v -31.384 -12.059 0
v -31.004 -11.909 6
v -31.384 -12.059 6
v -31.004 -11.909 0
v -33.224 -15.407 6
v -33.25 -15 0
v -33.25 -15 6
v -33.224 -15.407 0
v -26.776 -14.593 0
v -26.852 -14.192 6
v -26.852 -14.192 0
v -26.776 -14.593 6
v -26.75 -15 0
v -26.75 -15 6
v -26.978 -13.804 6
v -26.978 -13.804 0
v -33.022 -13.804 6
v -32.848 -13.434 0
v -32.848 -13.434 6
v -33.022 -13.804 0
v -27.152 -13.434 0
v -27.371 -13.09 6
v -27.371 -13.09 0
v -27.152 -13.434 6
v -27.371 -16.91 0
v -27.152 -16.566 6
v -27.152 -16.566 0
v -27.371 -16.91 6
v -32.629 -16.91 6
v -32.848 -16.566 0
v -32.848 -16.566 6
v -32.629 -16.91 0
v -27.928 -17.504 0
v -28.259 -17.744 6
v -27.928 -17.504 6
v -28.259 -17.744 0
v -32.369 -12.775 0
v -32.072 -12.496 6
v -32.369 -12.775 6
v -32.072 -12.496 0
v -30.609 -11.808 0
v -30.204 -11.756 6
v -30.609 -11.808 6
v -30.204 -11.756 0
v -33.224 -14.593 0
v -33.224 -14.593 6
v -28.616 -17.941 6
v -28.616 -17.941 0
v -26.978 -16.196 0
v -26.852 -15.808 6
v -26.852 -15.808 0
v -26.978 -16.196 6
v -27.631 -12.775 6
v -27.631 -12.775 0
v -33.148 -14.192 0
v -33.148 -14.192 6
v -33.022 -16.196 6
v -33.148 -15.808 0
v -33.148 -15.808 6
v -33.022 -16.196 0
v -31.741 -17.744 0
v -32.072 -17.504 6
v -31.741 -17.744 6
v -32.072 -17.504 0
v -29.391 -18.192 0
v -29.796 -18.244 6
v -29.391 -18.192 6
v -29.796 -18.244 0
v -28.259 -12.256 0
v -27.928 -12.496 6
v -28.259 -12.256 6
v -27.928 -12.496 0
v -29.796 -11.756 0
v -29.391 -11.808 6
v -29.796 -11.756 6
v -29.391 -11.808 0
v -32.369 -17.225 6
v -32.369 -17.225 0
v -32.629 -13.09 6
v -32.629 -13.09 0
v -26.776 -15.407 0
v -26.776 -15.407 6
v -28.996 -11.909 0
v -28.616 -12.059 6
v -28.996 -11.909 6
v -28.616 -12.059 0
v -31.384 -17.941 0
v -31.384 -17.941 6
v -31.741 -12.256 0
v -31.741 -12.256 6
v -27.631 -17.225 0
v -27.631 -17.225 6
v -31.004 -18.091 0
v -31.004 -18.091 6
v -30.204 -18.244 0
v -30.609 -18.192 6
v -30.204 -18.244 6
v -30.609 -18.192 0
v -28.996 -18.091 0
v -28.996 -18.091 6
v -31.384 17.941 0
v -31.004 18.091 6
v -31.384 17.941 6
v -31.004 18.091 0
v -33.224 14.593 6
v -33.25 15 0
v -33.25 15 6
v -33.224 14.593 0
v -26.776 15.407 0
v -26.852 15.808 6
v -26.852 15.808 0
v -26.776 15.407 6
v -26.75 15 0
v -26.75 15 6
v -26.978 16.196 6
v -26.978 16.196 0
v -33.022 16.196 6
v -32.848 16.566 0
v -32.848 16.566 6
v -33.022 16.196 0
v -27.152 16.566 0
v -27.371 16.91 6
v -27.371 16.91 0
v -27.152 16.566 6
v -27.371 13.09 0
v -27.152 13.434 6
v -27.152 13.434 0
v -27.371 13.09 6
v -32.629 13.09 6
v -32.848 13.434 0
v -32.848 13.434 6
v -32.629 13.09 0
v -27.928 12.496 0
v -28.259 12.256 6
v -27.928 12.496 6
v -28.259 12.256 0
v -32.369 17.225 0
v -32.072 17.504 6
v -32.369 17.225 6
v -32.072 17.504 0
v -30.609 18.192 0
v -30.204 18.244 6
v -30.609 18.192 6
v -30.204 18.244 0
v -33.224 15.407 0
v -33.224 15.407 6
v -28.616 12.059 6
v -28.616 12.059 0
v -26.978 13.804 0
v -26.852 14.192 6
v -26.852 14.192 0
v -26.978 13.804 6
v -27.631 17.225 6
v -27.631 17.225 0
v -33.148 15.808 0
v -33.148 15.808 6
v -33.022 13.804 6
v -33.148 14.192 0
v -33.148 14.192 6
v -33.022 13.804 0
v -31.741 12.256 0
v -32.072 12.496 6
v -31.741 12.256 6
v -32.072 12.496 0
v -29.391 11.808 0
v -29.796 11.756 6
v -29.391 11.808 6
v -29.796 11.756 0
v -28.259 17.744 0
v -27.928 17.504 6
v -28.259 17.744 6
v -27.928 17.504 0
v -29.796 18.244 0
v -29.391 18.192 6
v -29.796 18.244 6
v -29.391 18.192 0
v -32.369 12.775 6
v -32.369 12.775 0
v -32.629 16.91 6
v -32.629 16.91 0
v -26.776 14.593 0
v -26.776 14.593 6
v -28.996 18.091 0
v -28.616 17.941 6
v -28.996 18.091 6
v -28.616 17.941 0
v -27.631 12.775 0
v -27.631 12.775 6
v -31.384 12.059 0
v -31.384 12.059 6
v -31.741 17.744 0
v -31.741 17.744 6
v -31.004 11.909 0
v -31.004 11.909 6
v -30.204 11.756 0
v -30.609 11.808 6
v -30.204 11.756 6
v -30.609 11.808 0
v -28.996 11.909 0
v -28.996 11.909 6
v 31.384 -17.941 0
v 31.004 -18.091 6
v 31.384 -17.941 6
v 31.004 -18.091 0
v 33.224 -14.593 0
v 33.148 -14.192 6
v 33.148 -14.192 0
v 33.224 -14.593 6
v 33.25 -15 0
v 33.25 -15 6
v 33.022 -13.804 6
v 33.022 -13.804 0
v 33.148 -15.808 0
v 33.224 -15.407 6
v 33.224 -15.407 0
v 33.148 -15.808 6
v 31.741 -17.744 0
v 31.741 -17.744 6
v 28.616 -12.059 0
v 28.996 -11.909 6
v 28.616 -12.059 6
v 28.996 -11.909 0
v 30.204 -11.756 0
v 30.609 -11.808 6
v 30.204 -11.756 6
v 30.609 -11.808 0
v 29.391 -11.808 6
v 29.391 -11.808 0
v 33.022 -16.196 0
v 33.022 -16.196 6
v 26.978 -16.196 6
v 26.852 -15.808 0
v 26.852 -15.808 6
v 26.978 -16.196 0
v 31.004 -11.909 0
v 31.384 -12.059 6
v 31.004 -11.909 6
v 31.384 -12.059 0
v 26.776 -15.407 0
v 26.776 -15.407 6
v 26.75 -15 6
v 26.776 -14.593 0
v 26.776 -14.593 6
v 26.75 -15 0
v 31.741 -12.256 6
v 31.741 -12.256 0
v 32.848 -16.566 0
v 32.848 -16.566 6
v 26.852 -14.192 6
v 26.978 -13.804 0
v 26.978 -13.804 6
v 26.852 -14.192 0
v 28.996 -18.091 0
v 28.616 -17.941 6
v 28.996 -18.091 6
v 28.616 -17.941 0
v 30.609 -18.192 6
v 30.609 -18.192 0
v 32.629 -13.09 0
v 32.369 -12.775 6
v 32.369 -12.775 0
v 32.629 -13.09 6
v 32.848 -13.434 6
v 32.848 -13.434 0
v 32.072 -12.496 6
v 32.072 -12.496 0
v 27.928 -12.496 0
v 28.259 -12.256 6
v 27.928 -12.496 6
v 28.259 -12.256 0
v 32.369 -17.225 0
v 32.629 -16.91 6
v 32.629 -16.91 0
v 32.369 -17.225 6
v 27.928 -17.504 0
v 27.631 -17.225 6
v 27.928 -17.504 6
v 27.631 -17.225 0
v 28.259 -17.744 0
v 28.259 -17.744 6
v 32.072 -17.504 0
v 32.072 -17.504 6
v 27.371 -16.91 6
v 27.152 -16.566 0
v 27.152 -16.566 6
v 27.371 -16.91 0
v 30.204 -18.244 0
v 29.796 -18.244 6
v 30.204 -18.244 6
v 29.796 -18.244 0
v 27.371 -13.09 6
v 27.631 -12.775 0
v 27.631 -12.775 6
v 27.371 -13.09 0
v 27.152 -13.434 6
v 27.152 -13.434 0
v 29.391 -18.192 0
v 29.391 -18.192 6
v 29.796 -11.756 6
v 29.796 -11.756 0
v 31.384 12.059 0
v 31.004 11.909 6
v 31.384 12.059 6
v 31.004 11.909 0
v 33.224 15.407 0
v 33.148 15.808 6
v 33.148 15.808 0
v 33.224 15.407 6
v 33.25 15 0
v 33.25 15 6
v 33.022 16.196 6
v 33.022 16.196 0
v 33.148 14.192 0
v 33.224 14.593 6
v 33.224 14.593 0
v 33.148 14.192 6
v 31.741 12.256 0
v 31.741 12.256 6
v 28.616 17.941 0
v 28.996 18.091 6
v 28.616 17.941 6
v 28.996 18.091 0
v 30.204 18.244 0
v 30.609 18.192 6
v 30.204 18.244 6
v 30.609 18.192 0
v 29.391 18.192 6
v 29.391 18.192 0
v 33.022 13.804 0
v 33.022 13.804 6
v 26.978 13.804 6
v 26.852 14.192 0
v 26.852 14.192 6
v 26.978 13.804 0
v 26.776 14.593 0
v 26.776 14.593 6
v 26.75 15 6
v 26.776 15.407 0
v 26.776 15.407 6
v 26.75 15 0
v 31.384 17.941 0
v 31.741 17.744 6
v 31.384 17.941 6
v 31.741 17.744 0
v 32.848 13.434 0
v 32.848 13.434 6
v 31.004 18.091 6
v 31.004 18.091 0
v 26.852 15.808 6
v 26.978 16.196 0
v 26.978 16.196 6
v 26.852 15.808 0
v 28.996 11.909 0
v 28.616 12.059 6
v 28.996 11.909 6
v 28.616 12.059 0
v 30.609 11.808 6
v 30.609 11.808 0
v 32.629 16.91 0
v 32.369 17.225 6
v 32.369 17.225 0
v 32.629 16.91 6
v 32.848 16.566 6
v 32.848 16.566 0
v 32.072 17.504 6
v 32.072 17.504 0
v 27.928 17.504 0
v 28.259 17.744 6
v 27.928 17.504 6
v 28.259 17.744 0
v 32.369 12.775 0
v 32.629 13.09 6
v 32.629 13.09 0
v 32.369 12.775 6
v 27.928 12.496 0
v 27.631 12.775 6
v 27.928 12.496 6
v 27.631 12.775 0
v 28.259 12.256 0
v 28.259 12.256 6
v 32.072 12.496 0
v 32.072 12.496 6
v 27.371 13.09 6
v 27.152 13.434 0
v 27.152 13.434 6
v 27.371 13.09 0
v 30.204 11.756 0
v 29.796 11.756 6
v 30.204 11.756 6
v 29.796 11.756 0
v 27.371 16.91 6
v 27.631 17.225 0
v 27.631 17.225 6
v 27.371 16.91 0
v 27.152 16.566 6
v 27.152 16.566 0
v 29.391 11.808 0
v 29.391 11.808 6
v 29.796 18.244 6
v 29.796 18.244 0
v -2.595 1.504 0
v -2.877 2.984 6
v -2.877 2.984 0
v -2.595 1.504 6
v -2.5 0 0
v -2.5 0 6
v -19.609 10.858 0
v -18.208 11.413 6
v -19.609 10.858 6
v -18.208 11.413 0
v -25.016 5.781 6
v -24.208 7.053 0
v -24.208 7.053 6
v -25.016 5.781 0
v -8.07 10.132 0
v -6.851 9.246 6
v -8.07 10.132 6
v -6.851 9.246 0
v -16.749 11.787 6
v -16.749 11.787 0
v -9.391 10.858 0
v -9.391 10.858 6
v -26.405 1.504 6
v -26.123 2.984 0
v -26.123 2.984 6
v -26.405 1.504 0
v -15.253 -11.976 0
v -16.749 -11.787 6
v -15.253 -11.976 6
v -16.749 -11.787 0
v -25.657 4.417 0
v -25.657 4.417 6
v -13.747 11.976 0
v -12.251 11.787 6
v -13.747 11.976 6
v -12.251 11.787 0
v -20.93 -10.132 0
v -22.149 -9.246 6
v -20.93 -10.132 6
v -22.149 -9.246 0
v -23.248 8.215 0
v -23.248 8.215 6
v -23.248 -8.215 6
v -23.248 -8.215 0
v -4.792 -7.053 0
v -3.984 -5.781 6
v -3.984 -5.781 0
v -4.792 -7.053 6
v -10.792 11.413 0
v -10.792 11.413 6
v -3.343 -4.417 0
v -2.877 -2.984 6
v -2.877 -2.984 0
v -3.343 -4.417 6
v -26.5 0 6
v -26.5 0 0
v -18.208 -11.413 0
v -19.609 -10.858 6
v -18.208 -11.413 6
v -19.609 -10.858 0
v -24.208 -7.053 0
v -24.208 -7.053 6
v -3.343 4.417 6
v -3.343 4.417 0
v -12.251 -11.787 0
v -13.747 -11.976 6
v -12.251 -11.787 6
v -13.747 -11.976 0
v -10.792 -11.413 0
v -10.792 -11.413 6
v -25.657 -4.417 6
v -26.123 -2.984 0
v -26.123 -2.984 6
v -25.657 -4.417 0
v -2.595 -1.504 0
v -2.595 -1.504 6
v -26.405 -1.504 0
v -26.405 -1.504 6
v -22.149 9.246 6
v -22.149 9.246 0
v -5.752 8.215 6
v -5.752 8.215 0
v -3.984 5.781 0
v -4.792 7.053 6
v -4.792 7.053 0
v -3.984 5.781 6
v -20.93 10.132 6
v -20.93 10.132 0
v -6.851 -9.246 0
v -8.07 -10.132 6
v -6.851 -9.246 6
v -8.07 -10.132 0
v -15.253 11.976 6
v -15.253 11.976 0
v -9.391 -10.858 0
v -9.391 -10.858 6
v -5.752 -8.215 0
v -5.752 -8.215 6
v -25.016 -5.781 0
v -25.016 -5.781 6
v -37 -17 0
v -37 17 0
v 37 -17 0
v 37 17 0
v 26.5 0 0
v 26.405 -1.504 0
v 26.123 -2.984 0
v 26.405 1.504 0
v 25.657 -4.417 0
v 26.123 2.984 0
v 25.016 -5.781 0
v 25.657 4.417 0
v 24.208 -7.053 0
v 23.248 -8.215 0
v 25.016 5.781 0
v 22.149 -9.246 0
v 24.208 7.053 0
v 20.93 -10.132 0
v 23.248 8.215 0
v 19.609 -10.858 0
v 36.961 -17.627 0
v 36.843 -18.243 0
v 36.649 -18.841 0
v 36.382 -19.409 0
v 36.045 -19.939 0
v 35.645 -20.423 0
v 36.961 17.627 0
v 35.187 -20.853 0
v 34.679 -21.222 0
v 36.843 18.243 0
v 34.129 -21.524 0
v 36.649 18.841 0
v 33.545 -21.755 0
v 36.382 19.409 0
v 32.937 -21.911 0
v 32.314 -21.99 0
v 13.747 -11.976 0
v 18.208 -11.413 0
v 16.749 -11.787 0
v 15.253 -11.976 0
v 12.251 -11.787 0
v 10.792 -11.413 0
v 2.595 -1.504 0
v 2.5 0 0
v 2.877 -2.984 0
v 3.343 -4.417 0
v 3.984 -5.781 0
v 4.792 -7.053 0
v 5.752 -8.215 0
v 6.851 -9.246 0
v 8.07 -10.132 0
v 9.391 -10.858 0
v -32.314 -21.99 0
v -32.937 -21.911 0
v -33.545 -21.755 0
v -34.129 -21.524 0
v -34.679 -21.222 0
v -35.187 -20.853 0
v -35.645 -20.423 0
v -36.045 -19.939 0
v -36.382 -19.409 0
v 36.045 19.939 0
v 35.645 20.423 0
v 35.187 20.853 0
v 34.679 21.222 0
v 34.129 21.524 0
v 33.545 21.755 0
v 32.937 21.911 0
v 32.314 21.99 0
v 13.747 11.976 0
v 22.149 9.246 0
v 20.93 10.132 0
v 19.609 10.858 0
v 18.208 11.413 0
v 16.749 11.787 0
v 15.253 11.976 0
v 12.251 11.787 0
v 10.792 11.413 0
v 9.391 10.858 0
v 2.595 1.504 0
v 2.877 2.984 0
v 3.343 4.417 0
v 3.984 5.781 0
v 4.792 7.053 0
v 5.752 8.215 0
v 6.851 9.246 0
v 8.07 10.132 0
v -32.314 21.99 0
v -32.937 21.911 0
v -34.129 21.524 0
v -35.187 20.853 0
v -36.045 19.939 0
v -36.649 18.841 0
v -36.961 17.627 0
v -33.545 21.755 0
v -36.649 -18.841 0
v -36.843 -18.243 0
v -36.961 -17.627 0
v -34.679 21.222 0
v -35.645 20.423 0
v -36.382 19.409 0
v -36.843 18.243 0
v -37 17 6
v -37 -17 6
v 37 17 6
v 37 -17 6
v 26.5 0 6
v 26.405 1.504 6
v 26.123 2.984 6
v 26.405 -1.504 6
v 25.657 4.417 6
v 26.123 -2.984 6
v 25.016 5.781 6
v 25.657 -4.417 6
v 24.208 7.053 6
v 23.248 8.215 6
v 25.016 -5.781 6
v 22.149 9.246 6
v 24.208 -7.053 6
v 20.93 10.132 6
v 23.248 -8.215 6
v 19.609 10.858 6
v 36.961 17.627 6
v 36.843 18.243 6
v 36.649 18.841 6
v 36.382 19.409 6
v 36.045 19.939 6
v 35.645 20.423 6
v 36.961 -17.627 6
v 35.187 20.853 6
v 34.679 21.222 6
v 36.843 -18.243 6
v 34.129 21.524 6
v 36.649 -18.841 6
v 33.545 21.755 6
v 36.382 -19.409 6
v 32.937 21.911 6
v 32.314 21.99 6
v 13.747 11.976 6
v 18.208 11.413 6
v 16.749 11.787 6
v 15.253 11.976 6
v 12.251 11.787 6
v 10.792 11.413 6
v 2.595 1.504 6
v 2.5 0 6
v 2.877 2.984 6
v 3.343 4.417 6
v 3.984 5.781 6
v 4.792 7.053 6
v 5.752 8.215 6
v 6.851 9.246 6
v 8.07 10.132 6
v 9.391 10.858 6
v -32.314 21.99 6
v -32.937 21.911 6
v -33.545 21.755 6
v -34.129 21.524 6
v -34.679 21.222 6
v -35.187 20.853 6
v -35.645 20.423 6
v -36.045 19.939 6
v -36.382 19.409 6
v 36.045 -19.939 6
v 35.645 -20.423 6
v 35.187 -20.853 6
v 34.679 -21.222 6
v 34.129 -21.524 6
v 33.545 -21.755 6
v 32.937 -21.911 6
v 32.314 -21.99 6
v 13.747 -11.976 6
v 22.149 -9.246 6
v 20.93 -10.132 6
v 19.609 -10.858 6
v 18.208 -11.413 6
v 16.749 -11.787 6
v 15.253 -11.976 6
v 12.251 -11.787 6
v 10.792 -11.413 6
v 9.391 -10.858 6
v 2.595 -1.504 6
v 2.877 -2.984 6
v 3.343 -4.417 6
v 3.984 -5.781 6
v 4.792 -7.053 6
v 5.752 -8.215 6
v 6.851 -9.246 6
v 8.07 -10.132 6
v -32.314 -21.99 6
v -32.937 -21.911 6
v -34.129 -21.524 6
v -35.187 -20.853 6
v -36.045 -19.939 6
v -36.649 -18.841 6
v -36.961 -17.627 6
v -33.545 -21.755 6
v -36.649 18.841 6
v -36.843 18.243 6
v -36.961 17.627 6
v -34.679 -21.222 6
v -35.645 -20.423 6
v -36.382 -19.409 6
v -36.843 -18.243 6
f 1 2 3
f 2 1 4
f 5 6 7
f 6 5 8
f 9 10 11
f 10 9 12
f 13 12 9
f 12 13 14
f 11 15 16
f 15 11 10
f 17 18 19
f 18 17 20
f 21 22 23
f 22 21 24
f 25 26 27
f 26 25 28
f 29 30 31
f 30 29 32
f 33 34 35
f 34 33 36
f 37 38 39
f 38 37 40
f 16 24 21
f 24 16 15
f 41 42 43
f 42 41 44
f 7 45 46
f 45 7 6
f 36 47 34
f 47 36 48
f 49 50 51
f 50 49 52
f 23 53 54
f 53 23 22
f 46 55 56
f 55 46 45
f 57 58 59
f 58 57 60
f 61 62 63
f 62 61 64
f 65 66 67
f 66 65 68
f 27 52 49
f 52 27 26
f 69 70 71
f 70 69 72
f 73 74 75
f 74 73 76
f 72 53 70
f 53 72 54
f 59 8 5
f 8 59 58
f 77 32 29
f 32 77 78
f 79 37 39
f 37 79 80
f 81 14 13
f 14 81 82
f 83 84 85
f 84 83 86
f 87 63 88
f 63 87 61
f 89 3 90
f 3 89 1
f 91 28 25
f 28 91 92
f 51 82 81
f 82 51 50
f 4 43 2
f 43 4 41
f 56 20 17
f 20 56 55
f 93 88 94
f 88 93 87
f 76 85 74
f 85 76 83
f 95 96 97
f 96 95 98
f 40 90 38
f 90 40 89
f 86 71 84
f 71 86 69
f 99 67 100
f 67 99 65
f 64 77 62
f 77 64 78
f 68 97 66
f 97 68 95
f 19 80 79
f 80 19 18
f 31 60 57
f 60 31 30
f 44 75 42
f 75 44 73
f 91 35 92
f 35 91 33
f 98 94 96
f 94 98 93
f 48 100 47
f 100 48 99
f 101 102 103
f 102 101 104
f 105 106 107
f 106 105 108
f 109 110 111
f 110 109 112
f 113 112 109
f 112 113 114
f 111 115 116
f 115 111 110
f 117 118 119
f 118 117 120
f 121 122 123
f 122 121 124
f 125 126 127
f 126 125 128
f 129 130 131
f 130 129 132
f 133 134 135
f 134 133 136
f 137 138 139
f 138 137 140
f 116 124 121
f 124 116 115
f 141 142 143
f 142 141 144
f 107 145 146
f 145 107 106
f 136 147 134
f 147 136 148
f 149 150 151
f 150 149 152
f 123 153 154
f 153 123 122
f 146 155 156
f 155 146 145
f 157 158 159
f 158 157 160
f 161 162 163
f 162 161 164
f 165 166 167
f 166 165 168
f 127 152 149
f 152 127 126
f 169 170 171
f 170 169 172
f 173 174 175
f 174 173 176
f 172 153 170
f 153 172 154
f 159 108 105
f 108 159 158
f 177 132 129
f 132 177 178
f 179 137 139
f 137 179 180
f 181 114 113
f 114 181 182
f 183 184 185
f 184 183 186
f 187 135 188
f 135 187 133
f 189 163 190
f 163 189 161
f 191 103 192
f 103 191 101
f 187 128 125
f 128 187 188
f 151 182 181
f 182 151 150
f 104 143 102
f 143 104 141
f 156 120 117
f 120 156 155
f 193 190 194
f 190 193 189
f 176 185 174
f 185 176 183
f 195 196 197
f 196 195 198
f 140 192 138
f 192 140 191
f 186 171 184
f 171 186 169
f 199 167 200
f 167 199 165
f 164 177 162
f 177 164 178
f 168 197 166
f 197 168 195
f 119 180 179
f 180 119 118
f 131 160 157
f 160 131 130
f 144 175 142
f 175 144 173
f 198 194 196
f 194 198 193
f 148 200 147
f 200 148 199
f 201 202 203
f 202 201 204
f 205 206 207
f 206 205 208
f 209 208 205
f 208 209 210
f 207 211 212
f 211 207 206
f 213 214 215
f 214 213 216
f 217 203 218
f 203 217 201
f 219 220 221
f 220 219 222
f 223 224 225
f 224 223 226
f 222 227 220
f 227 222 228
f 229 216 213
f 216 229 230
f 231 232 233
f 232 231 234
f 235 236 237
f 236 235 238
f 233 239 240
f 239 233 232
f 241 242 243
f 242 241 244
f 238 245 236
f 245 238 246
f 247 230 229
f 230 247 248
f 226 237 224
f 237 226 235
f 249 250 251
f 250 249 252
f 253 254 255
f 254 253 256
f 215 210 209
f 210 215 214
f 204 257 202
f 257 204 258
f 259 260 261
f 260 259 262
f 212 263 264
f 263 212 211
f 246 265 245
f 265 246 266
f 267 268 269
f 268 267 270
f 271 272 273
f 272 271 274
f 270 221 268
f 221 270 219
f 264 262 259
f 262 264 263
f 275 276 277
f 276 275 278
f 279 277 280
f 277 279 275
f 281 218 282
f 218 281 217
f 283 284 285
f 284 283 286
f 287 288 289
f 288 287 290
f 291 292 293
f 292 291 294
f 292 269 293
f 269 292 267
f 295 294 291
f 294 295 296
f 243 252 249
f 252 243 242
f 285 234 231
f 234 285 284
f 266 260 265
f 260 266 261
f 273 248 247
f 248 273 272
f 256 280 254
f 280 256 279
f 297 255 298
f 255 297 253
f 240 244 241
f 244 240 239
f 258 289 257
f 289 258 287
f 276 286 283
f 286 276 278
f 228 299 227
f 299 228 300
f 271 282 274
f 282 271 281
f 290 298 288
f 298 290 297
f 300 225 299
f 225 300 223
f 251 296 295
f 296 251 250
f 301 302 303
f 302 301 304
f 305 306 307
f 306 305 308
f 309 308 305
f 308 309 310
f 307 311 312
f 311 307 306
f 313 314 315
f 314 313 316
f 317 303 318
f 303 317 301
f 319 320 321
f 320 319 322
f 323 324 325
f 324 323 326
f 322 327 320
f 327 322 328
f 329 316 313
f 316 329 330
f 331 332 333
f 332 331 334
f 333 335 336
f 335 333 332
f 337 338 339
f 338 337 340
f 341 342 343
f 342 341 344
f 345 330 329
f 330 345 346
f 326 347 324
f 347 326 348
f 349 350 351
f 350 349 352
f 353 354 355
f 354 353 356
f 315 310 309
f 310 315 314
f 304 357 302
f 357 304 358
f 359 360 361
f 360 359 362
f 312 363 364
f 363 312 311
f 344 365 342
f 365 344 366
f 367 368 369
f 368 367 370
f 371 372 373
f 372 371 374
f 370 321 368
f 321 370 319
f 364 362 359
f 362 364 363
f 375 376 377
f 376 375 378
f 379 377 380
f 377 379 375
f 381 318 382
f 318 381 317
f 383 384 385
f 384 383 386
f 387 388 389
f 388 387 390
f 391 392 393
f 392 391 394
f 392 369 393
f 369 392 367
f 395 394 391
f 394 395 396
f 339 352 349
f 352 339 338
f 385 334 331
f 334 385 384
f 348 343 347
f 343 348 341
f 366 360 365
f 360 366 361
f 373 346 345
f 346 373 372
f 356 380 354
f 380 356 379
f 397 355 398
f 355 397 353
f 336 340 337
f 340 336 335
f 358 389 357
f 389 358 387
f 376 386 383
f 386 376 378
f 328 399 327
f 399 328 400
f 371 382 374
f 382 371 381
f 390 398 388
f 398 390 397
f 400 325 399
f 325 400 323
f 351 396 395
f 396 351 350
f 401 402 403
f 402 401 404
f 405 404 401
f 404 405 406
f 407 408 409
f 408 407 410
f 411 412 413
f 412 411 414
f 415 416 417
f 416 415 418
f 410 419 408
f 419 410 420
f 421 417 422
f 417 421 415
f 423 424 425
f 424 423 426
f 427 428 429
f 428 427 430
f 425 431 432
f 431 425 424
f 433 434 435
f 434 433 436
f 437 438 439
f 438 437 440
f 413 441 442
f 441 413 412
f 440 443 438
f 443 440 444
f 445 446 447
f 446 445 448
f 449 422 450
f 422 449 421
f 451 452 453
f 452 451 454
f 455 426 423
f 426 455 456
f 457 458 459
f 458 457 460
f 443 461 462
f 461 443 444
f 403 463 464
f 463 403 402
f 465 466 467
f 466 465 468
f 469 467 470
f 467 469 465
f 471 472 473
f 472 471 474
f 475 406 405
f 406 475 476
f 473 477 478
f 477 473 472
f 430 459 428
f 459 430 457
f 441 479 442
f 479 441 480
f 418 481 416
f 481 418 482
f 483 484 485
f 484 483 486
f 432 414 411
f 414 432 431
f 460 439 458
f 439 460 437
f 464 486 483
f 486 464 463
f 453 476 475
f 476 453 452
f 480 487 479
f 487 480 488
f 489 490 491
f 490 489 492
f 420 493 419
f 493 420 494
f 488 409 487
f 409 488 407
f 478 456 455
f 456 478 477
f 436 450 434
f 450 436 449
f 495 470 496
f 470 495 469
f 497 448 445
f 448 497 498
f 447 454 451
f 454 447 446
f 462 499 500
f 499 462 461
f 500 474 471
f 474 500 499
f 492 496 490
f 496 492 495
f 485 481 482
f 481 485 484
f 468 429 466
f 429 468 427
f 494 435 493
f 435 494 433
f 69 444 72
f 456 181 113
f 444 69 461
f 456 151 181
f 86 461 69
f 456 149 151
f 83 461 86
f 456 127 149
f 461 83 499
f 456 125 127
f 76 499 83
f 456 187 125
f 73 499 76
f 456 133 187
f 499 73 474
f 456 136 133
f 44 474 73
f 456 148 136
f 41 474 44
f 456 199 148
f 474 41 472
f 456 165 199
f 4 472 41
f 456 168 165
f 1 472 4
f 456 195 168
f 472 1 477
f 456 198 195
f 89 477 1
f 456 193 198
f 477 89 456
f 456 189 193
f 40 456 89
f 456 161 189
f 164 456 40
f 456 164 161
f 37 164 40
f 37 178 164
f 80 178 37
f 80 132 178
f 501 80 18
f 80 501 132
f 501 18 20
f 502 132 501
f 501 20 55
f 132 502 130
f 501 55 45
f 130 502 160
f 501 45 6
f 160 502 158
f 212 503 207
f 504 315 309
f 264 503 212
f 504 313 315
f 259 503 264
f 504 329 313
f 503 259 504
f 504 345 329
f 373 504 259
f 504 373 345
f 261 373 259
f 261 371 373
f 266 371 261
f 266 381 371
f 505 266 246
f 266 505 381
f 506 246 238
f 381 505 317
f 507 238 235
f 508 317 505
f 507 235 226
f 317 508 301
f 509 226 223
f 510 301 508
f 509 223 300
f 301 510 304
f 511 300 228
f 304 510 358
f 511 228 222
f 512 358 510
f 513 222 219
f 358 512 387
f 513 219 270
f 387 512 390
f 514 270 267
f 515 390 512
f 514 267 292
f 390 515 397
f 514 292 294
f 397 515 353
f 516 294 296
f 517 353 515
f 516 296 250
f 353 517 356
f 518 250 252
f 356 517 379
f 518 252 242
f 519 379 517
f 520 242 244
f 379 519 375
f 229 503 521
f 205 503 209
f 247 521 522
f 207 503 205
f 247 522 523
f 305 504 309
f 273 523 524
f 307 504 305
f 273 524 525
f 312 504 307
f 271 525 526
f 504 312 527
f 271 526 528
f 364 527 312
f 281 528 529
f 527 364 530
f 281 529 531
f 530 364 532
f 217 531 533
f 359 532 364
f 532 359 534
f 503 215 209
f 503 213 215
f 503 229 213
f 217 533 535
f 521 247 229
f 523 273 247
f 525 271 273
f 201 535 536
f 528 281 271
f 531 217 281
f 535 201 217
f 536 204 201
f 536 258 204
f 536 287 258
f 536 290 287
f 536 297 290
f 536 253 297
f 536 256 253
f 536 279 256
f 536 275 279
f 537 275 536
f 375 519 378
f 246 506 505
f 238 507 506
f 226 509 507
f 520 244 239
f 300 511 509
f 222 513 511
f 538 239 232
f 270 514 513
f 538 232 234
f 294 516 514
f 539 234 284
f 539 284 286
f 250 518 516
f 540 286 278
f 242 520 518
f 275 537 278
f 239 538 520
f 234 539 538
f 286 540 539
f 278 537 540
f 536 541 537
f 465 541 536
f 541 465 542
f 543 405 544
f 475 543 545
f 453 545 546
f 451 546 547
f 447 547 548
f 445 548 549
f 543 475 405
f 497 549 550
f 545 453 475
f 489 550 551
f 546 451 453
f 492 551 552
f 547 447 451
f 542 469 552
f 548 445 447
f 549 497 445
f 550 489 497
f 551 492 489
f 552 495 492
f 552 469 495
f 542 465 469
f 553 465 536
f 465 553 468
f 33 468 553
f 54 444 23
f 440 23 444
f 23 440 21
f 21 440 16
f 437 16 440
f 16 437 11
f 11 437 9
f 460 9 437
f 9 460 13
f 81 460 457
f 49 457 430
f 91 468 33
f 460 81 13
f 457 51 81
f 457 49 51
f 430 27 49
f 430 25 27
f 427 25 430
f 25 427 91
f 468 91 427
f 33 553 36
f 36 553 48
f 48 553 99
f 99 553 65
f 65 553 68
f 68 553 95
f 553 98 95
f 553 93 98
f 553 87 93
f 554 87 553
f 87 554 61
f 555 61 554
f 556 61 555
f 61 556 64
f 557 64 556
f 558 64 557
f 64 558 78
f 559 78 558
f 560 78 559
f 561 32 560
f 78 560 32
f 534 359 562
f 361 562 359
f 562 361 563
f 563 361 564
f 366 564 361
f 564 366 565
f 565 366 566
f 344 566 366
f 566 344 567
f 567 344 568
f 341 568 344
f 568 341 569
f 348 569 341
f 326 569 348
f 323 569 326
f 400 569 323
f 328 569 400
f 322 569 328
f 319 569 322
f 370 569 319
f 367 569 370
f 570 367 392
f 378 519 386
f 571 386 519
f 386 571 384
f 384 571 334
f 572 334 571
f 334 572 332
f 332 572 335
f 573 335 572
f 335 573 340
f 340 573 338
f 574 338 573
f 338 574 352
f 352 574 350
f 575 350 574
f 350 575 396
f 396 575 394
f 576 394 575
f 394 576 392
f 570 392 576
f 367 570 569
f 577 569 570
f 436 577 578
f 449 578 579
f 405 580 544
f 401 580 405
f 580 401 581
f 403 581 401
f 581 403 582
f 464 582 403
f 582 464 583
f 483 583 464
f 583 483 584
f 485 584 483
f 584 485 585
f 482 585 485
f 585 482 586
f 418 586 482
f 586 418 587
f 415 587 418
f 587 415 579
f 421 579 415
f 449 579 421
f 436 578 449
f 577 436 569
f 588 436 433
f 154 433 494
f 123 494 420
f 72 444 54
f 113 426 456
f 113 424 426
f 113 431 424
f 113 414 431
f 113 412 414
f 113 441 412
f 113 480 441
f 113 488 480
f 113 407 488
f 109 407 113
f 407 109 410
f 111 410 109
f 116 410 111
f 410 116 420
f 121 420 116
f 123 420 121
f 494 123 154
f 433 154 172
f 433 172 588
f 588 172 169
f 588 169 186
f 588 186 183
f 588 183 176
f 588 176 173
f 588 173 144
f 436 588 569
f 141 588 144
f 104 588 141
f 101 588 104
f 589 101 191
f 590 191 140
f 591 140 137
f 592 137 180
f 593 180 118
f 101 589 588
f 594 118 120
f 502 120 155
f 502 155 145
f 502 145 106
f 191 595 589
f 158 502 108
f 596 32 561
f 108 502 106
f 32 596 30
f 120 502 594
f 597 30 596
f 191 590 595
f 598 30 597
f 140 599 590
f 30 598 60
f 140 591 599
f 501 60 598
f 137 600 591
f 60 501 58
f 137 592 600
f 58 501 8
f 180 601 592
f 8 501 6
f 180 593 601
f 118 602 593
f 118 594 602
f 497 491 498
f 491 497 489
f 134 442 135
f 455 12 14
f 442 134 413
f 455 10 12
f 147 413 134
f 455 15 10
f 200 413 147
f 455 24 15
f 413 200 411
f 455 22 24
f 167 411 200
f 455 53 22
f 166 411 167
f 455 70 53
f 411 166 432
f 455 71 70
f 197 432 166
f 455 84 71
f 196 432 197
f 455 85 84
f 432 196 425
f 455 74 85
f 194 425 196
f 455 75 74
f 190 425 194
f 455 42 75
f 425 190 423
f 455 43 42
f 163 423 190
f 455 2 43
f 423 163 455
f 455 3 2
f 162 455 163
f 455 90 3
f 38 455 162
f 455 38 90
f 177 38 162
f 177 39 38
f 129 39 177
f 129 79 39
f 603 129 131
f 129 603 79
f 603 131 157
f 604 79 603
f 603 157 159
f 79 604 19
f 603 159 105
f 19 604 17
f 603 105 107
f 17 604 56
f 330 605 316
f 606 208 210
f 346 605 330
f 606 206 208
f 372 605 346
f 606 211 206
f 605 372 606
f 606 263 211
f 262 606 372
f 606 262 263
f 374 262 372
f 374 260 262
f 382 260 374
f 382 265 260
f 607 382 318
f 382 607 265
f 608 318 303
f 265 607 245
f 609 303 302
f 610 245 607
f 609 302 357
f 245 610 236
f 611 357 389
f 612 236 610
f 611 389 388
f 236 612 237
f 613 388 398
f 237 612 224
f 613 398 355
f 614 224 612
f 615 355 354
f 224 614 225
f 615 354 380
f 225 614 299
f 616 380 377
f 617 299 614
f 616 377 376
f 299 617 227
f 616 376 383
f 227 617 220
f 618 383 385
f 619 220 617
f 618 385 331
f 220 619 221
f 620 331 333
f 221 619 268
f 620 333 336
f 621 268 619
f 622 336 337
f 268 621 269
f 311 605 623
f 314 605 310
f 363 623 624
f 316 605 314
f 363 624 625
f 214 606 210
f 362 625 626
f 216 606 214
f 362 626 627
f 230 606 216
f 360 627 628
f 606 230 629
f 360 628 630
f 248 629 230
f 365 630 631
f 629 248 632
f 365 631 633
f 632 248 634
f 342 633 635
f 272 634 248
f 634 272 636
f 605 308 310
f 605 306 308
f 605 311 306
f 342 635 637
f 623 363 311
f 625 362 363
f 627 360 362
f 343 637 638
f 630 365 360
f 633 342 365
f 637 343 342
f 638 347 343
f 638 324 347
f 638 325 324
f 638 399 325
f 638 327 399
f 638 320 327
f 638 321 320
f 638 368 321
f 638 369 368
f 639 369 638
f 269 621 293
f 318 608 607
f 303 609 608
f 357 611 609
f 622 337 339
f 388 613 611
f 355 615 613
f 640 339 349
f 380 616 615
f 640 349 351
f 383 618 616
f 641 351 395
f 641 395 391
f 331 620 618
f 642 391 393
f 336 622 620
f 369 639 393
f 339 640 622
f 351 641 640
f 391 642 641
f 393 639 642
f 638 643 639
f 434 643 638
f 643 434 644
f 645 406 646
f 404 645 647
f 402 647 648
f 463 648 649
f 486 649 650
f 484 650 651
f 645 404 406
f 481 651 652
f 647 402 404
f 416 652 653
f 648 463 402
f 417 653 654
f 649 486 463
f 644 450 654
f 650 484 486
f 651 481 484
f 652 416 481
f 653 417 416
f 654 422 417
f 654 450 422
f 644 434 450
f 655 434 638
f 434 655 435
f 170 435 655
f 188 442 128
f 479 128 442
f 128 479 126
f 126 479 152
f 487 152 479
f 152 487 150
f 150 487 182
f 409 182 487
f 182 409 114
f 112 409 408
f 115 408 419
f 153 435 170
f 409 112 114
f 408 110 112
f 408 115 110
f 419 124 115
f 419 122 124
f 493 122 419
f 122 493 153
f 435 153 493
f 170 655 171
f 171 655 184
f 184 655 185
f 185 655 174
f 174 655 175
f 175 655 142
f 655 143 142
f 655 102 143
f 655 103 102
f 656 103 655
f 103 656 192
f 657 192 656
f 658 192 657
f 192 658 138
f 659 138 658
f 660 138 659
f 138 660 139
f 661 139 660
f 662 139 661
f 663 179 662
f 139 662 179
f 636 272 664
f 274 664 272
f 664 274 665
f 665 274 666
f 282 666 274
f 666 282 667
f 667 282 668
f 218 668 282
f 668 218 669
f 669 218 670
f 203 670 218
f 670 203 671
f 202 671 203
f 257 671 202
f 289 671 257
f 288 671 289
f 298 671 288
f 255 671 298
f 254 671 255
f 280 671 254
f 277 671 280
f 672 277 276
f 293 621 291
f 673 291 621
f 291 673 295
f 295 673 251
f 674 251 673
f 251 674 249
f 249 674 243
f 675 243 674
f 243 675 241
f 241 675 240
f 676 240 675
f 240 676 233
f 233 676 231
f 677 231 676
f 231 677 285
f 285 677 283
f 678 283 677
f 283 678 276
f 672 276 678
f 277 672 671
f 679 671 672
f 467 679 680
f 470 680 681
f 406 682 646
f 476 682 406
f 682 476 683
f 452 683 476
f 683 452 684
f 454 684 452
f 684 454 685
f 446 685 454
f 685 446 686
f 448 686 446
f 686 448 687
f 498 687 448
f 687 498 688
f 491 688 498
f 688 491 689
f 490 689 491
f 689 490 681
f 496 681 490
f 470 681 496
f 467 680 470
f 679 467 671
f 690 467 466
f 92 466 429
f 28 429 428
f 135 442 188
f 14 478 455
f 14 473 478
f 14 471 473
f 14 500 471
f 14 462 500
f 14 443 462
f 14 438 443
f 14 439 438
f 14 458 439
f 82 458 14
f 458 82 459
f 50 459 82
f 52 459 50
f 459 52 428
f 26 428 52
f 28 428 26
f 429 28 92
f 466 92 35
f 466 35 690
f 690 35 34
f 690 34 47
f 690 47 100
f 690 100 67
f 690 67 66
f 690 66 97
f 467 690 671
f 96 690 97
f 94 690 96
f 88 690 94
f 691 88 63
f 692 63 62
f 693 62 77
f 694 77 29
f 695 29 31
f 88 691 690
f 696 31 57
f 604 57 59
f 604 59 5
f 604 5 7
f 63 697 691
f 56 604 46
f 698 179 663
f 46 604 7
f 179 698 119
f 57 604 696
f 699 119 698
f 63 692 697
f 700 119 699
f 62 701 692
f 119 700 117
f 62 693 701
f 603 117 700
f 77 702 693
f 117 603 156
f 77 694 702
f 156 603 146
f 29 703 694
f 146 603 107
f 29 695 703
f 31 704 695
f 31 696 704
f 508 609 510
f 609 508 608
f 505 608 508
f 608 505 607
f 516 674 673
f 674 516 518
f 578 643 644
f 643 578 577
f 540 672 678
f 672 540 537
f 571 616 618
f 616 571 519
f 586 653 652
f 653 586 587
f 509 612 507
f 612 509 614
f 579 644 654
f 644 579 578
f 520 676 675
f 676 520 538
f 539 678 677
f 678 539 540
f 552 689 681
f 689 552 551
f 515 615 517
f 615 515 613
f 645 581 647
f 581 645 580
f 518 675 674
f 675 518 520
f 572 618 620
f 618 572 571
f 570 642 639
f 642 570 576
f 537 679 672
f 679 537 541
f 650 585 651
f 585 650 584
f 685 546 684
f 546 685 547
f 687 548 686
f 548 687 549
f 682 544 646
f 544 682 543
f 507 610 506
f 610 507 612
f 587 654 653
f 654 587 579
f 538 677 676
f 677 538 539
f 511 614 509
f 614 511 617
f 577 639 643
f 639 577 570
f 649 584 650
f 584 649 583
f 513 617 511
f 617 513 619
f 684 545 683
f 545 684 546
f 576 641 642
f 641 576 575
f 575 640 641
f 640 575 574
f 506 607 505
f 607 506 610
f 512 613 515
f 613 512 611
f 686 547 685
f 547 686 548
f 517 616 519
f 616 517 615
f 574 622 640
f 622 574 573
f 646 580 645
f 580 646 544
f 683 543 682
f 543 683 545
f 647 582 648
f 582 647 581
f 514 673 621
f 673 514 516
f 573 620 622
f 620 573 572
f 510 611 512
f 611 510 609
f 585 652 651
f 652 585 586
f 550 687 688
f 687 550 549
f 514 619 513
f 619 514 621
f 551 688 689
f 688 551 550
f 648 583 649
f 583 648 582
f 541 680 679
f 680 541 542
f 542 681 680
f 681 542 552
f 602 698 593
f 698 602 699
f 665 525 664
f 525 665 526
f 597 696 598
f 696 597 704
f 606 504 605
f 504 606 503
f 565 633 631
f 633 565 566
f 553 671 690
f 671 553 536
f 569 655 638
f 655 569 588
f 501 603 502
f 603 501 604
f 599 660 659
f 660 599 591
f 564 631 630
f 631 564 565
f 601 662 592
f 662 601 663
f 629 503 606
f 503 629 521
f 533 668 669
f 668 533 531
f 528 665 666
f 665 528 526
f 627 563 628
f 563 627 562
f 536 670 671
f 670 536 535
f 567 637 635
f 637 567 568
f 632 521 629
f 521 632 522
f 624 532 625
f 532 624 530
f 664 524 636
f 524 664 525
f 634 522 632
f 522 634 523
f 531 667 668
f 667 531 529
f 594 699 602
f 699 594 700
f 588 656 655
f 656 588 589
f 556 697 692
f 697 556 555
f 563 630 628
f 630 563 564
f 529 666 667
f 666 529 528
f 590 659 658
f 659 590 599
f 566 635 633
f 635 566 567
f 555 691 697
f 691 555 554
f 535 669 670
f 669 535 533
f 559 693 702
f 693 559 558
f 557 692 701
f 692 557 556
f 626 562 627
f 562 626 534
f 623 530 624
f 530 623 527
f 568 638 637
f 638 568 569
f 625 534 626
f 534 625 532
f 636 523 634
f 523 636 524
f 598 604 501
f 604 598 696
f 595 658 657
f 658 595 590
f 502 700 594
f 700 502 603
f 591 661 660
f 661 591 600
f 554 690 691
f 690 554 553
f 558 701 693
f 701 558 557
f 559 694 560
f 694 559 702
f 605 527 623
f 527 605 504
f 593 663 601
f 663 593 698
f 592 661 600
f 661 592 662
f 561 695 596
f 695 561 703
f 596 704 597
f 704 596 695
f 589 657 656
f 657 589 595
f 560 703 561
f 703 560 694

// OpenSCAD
$fn = 50;


difference() {
	union() {
		hull() {
			translate(v = [-32.0000000000, 17.0000000000, 0]) {
				cylinder(h = 6, r = 5);
			}
			translate(v = [32.0000000000, 17.0000000000, 0]) {
				cylinder(h = 6, r = 5);
			}
			translate(v = [-32.0000000000, -17.0000000000, 0]) {
				cylinder(h = 6, r = 5);
			}
			translate(v = [32.0000000000, -17.0000000000, 0]) {
				cylinder(h = 6, r = 5);
			}
		}
	}
	union() {
		#translate(v = [-30.0000000000, -15.0000000000, -100.0000000000]) {
			cylinder(h = 200, r = 3.2500000000);
		}
		#translate(v = [-30.0000000000, 15.0000000000, -100.0000000000]) {
			cylinder(h = 200, r = 3.2500000000);
		}
		#translate(v = [30.0000000000, -15.0000000000, -100.0000000000]) {
			cylinder(h = 200, r = 3.2500000000);
		}
		#translate(v = [30.0000000000, 15.0000000000, -100.0000000000]) {
			cylinder(h = 200, r = 3.2500000000);
		}
		#translate(v = [-14.5000000000, 0, 0]) {
			cylinder(h = 6, r = 12.0000000000);
		}
		#translate(v = [14.5000000000, 0, 0]) {
			cylinder(h = 6, r = 12.0000000000);
		}
	}
}
